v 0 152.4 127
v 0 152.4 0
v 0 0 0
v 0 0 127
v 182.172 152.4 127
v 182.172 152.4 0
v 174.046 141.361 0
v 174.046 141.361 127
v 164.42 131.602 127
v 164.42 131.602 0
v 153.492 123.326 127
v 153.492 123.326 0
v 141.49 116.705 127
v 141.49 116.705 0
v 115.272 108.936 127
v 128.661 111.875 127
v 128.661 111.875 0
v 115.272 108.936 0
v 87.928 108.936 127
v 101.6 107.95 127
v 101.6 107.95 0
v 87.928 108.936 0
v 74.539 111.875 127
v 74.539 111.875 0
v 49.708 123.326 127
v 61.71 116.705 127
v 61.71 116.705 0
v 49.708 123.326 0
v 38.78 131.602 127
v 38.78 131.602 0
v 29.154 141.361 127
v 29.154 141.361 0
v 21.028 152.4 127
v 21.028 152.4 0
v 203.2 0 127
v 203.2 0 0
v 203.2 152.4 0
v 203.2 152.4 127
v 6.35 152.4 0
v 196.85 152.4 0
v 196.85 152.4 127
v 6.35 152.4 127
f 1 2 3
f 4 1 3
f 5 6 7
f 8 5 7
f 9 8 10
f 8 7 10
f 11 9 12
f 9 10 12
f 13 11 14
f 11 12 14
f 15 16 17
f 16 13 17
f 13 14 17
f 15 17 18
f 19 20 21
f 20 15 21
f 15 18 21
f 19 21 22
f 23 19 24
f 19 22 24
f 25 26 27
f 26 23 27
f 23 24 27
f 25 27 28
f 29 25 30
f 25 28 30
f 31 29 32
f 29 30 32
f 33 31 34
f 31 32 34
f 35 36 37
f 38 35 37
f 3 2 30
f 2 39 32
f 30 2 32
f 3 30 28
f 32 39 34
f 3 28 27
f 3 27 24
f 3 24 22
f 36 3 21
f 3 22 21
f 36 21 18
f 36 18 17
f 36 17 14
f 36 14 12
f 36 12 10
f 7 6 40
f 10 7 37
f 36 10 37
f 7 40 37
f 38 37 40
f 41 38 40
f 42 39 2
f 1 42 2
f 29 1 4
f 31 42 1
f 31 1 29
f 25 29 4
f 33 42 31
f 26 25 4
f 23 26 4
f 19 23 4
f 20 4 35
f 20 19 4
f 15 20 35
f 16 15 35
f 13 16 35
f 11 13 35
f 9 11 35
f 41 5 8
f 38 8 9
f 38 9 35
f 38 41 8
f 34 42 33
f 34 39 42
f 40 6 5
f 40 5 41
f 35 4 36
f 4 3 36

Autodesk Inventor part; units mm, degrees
ref_plane "YZ Plane" through (0, 0, 0) normal (1, 0, 0) x (0, 1, 0)
ref_plane "XZ Plane" through (0, 0, 0) normal (0, 1, 0) x (-1, 0, 0)
ref_plane "XY Plane" through (0, 0, 0) normal (0, 0, 1) x (1, 0, 0)
sketch "Sketch1" plane through (0, 0, 0) normal (0, 0, 1) x (1, 0, 0)
  line L0 (0, 0) -> (203.2, 0)
  line L1 (203.2, 0) -> (203.2, 152.4)
  line L2 (0, 152.4) -> (0, 0)
  line L3 (203.2, 152.4) -> (196.85, 152.4)
  line L4 (6.35, 152.4) -> (0, 152.4)
  line L5 (101.6, 152.4) -> (101.6, 203.2)
  arc A0 (21.0275, 152.4) -> (182.1725, 152.4) centre (101.6, 203.2) ccw
  line L6 (6.35, 152.4) -> (21.0275, 152.4)
  line L7 (182.1725, 152.4) -> (196.85, 152.4)
  dimension "d0" = 203.2
  dimension "d1" = 152.4
  dimension "d5" = 50.8
  dimension "d6" = 190.5
extrude "Extrusion1" add sketch "Sketch1" along normal blind 127
properties part number "tankMount"
